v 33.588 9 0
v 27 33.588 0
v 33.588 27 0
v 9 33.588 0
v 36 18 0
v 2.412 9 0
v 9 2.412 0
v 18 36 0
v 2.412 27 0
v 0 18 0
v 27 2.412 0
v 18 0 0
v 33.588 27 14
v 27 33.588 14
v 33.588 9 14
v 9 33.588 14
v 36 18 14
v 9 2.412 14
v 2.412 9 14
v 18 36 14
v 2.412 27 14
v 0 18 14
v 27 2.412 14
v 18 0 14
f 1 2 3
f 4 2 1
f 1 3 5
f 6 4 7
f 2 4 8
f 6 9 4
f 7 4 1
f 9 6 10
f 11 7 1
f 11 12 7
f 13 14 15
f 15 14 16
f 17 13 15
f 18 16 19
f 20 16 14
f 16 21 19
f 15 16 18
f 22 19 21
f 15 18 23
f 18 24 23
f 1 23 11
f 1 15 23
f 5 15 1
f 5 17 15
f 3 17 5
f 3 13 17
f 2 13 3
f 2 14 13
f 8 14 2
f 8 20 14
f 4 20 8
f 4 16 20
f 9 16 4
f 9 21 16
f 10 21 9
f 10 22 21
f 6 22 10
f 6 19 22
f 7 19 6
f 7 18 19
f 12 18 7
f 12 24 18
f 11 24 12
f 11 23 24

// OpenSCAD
$fn = 32;

// ----------------------------------------------------------------------
// Flat adaptor: keyed, 14 mm thick
// ----------------------------------------------------------------------

// --- parameters (mm) ---
profile_height = 14;      // extrusion height
profile_points = 12;      // points of the closed outline

profile = [[0, 18], [2.412, 9], [9, 2.412], [18, 0], [27, 2.412], [33.588, 9], [36, 18], [33.588, 27], [27, 33.588], [18, 36], [9, 33.588], [2.412, 27]];  // single closed polygon, 12 points, counter clockwise

// --- the one profile operation ---
linear_extrude(height = profile_height) polygon(points = profile);
